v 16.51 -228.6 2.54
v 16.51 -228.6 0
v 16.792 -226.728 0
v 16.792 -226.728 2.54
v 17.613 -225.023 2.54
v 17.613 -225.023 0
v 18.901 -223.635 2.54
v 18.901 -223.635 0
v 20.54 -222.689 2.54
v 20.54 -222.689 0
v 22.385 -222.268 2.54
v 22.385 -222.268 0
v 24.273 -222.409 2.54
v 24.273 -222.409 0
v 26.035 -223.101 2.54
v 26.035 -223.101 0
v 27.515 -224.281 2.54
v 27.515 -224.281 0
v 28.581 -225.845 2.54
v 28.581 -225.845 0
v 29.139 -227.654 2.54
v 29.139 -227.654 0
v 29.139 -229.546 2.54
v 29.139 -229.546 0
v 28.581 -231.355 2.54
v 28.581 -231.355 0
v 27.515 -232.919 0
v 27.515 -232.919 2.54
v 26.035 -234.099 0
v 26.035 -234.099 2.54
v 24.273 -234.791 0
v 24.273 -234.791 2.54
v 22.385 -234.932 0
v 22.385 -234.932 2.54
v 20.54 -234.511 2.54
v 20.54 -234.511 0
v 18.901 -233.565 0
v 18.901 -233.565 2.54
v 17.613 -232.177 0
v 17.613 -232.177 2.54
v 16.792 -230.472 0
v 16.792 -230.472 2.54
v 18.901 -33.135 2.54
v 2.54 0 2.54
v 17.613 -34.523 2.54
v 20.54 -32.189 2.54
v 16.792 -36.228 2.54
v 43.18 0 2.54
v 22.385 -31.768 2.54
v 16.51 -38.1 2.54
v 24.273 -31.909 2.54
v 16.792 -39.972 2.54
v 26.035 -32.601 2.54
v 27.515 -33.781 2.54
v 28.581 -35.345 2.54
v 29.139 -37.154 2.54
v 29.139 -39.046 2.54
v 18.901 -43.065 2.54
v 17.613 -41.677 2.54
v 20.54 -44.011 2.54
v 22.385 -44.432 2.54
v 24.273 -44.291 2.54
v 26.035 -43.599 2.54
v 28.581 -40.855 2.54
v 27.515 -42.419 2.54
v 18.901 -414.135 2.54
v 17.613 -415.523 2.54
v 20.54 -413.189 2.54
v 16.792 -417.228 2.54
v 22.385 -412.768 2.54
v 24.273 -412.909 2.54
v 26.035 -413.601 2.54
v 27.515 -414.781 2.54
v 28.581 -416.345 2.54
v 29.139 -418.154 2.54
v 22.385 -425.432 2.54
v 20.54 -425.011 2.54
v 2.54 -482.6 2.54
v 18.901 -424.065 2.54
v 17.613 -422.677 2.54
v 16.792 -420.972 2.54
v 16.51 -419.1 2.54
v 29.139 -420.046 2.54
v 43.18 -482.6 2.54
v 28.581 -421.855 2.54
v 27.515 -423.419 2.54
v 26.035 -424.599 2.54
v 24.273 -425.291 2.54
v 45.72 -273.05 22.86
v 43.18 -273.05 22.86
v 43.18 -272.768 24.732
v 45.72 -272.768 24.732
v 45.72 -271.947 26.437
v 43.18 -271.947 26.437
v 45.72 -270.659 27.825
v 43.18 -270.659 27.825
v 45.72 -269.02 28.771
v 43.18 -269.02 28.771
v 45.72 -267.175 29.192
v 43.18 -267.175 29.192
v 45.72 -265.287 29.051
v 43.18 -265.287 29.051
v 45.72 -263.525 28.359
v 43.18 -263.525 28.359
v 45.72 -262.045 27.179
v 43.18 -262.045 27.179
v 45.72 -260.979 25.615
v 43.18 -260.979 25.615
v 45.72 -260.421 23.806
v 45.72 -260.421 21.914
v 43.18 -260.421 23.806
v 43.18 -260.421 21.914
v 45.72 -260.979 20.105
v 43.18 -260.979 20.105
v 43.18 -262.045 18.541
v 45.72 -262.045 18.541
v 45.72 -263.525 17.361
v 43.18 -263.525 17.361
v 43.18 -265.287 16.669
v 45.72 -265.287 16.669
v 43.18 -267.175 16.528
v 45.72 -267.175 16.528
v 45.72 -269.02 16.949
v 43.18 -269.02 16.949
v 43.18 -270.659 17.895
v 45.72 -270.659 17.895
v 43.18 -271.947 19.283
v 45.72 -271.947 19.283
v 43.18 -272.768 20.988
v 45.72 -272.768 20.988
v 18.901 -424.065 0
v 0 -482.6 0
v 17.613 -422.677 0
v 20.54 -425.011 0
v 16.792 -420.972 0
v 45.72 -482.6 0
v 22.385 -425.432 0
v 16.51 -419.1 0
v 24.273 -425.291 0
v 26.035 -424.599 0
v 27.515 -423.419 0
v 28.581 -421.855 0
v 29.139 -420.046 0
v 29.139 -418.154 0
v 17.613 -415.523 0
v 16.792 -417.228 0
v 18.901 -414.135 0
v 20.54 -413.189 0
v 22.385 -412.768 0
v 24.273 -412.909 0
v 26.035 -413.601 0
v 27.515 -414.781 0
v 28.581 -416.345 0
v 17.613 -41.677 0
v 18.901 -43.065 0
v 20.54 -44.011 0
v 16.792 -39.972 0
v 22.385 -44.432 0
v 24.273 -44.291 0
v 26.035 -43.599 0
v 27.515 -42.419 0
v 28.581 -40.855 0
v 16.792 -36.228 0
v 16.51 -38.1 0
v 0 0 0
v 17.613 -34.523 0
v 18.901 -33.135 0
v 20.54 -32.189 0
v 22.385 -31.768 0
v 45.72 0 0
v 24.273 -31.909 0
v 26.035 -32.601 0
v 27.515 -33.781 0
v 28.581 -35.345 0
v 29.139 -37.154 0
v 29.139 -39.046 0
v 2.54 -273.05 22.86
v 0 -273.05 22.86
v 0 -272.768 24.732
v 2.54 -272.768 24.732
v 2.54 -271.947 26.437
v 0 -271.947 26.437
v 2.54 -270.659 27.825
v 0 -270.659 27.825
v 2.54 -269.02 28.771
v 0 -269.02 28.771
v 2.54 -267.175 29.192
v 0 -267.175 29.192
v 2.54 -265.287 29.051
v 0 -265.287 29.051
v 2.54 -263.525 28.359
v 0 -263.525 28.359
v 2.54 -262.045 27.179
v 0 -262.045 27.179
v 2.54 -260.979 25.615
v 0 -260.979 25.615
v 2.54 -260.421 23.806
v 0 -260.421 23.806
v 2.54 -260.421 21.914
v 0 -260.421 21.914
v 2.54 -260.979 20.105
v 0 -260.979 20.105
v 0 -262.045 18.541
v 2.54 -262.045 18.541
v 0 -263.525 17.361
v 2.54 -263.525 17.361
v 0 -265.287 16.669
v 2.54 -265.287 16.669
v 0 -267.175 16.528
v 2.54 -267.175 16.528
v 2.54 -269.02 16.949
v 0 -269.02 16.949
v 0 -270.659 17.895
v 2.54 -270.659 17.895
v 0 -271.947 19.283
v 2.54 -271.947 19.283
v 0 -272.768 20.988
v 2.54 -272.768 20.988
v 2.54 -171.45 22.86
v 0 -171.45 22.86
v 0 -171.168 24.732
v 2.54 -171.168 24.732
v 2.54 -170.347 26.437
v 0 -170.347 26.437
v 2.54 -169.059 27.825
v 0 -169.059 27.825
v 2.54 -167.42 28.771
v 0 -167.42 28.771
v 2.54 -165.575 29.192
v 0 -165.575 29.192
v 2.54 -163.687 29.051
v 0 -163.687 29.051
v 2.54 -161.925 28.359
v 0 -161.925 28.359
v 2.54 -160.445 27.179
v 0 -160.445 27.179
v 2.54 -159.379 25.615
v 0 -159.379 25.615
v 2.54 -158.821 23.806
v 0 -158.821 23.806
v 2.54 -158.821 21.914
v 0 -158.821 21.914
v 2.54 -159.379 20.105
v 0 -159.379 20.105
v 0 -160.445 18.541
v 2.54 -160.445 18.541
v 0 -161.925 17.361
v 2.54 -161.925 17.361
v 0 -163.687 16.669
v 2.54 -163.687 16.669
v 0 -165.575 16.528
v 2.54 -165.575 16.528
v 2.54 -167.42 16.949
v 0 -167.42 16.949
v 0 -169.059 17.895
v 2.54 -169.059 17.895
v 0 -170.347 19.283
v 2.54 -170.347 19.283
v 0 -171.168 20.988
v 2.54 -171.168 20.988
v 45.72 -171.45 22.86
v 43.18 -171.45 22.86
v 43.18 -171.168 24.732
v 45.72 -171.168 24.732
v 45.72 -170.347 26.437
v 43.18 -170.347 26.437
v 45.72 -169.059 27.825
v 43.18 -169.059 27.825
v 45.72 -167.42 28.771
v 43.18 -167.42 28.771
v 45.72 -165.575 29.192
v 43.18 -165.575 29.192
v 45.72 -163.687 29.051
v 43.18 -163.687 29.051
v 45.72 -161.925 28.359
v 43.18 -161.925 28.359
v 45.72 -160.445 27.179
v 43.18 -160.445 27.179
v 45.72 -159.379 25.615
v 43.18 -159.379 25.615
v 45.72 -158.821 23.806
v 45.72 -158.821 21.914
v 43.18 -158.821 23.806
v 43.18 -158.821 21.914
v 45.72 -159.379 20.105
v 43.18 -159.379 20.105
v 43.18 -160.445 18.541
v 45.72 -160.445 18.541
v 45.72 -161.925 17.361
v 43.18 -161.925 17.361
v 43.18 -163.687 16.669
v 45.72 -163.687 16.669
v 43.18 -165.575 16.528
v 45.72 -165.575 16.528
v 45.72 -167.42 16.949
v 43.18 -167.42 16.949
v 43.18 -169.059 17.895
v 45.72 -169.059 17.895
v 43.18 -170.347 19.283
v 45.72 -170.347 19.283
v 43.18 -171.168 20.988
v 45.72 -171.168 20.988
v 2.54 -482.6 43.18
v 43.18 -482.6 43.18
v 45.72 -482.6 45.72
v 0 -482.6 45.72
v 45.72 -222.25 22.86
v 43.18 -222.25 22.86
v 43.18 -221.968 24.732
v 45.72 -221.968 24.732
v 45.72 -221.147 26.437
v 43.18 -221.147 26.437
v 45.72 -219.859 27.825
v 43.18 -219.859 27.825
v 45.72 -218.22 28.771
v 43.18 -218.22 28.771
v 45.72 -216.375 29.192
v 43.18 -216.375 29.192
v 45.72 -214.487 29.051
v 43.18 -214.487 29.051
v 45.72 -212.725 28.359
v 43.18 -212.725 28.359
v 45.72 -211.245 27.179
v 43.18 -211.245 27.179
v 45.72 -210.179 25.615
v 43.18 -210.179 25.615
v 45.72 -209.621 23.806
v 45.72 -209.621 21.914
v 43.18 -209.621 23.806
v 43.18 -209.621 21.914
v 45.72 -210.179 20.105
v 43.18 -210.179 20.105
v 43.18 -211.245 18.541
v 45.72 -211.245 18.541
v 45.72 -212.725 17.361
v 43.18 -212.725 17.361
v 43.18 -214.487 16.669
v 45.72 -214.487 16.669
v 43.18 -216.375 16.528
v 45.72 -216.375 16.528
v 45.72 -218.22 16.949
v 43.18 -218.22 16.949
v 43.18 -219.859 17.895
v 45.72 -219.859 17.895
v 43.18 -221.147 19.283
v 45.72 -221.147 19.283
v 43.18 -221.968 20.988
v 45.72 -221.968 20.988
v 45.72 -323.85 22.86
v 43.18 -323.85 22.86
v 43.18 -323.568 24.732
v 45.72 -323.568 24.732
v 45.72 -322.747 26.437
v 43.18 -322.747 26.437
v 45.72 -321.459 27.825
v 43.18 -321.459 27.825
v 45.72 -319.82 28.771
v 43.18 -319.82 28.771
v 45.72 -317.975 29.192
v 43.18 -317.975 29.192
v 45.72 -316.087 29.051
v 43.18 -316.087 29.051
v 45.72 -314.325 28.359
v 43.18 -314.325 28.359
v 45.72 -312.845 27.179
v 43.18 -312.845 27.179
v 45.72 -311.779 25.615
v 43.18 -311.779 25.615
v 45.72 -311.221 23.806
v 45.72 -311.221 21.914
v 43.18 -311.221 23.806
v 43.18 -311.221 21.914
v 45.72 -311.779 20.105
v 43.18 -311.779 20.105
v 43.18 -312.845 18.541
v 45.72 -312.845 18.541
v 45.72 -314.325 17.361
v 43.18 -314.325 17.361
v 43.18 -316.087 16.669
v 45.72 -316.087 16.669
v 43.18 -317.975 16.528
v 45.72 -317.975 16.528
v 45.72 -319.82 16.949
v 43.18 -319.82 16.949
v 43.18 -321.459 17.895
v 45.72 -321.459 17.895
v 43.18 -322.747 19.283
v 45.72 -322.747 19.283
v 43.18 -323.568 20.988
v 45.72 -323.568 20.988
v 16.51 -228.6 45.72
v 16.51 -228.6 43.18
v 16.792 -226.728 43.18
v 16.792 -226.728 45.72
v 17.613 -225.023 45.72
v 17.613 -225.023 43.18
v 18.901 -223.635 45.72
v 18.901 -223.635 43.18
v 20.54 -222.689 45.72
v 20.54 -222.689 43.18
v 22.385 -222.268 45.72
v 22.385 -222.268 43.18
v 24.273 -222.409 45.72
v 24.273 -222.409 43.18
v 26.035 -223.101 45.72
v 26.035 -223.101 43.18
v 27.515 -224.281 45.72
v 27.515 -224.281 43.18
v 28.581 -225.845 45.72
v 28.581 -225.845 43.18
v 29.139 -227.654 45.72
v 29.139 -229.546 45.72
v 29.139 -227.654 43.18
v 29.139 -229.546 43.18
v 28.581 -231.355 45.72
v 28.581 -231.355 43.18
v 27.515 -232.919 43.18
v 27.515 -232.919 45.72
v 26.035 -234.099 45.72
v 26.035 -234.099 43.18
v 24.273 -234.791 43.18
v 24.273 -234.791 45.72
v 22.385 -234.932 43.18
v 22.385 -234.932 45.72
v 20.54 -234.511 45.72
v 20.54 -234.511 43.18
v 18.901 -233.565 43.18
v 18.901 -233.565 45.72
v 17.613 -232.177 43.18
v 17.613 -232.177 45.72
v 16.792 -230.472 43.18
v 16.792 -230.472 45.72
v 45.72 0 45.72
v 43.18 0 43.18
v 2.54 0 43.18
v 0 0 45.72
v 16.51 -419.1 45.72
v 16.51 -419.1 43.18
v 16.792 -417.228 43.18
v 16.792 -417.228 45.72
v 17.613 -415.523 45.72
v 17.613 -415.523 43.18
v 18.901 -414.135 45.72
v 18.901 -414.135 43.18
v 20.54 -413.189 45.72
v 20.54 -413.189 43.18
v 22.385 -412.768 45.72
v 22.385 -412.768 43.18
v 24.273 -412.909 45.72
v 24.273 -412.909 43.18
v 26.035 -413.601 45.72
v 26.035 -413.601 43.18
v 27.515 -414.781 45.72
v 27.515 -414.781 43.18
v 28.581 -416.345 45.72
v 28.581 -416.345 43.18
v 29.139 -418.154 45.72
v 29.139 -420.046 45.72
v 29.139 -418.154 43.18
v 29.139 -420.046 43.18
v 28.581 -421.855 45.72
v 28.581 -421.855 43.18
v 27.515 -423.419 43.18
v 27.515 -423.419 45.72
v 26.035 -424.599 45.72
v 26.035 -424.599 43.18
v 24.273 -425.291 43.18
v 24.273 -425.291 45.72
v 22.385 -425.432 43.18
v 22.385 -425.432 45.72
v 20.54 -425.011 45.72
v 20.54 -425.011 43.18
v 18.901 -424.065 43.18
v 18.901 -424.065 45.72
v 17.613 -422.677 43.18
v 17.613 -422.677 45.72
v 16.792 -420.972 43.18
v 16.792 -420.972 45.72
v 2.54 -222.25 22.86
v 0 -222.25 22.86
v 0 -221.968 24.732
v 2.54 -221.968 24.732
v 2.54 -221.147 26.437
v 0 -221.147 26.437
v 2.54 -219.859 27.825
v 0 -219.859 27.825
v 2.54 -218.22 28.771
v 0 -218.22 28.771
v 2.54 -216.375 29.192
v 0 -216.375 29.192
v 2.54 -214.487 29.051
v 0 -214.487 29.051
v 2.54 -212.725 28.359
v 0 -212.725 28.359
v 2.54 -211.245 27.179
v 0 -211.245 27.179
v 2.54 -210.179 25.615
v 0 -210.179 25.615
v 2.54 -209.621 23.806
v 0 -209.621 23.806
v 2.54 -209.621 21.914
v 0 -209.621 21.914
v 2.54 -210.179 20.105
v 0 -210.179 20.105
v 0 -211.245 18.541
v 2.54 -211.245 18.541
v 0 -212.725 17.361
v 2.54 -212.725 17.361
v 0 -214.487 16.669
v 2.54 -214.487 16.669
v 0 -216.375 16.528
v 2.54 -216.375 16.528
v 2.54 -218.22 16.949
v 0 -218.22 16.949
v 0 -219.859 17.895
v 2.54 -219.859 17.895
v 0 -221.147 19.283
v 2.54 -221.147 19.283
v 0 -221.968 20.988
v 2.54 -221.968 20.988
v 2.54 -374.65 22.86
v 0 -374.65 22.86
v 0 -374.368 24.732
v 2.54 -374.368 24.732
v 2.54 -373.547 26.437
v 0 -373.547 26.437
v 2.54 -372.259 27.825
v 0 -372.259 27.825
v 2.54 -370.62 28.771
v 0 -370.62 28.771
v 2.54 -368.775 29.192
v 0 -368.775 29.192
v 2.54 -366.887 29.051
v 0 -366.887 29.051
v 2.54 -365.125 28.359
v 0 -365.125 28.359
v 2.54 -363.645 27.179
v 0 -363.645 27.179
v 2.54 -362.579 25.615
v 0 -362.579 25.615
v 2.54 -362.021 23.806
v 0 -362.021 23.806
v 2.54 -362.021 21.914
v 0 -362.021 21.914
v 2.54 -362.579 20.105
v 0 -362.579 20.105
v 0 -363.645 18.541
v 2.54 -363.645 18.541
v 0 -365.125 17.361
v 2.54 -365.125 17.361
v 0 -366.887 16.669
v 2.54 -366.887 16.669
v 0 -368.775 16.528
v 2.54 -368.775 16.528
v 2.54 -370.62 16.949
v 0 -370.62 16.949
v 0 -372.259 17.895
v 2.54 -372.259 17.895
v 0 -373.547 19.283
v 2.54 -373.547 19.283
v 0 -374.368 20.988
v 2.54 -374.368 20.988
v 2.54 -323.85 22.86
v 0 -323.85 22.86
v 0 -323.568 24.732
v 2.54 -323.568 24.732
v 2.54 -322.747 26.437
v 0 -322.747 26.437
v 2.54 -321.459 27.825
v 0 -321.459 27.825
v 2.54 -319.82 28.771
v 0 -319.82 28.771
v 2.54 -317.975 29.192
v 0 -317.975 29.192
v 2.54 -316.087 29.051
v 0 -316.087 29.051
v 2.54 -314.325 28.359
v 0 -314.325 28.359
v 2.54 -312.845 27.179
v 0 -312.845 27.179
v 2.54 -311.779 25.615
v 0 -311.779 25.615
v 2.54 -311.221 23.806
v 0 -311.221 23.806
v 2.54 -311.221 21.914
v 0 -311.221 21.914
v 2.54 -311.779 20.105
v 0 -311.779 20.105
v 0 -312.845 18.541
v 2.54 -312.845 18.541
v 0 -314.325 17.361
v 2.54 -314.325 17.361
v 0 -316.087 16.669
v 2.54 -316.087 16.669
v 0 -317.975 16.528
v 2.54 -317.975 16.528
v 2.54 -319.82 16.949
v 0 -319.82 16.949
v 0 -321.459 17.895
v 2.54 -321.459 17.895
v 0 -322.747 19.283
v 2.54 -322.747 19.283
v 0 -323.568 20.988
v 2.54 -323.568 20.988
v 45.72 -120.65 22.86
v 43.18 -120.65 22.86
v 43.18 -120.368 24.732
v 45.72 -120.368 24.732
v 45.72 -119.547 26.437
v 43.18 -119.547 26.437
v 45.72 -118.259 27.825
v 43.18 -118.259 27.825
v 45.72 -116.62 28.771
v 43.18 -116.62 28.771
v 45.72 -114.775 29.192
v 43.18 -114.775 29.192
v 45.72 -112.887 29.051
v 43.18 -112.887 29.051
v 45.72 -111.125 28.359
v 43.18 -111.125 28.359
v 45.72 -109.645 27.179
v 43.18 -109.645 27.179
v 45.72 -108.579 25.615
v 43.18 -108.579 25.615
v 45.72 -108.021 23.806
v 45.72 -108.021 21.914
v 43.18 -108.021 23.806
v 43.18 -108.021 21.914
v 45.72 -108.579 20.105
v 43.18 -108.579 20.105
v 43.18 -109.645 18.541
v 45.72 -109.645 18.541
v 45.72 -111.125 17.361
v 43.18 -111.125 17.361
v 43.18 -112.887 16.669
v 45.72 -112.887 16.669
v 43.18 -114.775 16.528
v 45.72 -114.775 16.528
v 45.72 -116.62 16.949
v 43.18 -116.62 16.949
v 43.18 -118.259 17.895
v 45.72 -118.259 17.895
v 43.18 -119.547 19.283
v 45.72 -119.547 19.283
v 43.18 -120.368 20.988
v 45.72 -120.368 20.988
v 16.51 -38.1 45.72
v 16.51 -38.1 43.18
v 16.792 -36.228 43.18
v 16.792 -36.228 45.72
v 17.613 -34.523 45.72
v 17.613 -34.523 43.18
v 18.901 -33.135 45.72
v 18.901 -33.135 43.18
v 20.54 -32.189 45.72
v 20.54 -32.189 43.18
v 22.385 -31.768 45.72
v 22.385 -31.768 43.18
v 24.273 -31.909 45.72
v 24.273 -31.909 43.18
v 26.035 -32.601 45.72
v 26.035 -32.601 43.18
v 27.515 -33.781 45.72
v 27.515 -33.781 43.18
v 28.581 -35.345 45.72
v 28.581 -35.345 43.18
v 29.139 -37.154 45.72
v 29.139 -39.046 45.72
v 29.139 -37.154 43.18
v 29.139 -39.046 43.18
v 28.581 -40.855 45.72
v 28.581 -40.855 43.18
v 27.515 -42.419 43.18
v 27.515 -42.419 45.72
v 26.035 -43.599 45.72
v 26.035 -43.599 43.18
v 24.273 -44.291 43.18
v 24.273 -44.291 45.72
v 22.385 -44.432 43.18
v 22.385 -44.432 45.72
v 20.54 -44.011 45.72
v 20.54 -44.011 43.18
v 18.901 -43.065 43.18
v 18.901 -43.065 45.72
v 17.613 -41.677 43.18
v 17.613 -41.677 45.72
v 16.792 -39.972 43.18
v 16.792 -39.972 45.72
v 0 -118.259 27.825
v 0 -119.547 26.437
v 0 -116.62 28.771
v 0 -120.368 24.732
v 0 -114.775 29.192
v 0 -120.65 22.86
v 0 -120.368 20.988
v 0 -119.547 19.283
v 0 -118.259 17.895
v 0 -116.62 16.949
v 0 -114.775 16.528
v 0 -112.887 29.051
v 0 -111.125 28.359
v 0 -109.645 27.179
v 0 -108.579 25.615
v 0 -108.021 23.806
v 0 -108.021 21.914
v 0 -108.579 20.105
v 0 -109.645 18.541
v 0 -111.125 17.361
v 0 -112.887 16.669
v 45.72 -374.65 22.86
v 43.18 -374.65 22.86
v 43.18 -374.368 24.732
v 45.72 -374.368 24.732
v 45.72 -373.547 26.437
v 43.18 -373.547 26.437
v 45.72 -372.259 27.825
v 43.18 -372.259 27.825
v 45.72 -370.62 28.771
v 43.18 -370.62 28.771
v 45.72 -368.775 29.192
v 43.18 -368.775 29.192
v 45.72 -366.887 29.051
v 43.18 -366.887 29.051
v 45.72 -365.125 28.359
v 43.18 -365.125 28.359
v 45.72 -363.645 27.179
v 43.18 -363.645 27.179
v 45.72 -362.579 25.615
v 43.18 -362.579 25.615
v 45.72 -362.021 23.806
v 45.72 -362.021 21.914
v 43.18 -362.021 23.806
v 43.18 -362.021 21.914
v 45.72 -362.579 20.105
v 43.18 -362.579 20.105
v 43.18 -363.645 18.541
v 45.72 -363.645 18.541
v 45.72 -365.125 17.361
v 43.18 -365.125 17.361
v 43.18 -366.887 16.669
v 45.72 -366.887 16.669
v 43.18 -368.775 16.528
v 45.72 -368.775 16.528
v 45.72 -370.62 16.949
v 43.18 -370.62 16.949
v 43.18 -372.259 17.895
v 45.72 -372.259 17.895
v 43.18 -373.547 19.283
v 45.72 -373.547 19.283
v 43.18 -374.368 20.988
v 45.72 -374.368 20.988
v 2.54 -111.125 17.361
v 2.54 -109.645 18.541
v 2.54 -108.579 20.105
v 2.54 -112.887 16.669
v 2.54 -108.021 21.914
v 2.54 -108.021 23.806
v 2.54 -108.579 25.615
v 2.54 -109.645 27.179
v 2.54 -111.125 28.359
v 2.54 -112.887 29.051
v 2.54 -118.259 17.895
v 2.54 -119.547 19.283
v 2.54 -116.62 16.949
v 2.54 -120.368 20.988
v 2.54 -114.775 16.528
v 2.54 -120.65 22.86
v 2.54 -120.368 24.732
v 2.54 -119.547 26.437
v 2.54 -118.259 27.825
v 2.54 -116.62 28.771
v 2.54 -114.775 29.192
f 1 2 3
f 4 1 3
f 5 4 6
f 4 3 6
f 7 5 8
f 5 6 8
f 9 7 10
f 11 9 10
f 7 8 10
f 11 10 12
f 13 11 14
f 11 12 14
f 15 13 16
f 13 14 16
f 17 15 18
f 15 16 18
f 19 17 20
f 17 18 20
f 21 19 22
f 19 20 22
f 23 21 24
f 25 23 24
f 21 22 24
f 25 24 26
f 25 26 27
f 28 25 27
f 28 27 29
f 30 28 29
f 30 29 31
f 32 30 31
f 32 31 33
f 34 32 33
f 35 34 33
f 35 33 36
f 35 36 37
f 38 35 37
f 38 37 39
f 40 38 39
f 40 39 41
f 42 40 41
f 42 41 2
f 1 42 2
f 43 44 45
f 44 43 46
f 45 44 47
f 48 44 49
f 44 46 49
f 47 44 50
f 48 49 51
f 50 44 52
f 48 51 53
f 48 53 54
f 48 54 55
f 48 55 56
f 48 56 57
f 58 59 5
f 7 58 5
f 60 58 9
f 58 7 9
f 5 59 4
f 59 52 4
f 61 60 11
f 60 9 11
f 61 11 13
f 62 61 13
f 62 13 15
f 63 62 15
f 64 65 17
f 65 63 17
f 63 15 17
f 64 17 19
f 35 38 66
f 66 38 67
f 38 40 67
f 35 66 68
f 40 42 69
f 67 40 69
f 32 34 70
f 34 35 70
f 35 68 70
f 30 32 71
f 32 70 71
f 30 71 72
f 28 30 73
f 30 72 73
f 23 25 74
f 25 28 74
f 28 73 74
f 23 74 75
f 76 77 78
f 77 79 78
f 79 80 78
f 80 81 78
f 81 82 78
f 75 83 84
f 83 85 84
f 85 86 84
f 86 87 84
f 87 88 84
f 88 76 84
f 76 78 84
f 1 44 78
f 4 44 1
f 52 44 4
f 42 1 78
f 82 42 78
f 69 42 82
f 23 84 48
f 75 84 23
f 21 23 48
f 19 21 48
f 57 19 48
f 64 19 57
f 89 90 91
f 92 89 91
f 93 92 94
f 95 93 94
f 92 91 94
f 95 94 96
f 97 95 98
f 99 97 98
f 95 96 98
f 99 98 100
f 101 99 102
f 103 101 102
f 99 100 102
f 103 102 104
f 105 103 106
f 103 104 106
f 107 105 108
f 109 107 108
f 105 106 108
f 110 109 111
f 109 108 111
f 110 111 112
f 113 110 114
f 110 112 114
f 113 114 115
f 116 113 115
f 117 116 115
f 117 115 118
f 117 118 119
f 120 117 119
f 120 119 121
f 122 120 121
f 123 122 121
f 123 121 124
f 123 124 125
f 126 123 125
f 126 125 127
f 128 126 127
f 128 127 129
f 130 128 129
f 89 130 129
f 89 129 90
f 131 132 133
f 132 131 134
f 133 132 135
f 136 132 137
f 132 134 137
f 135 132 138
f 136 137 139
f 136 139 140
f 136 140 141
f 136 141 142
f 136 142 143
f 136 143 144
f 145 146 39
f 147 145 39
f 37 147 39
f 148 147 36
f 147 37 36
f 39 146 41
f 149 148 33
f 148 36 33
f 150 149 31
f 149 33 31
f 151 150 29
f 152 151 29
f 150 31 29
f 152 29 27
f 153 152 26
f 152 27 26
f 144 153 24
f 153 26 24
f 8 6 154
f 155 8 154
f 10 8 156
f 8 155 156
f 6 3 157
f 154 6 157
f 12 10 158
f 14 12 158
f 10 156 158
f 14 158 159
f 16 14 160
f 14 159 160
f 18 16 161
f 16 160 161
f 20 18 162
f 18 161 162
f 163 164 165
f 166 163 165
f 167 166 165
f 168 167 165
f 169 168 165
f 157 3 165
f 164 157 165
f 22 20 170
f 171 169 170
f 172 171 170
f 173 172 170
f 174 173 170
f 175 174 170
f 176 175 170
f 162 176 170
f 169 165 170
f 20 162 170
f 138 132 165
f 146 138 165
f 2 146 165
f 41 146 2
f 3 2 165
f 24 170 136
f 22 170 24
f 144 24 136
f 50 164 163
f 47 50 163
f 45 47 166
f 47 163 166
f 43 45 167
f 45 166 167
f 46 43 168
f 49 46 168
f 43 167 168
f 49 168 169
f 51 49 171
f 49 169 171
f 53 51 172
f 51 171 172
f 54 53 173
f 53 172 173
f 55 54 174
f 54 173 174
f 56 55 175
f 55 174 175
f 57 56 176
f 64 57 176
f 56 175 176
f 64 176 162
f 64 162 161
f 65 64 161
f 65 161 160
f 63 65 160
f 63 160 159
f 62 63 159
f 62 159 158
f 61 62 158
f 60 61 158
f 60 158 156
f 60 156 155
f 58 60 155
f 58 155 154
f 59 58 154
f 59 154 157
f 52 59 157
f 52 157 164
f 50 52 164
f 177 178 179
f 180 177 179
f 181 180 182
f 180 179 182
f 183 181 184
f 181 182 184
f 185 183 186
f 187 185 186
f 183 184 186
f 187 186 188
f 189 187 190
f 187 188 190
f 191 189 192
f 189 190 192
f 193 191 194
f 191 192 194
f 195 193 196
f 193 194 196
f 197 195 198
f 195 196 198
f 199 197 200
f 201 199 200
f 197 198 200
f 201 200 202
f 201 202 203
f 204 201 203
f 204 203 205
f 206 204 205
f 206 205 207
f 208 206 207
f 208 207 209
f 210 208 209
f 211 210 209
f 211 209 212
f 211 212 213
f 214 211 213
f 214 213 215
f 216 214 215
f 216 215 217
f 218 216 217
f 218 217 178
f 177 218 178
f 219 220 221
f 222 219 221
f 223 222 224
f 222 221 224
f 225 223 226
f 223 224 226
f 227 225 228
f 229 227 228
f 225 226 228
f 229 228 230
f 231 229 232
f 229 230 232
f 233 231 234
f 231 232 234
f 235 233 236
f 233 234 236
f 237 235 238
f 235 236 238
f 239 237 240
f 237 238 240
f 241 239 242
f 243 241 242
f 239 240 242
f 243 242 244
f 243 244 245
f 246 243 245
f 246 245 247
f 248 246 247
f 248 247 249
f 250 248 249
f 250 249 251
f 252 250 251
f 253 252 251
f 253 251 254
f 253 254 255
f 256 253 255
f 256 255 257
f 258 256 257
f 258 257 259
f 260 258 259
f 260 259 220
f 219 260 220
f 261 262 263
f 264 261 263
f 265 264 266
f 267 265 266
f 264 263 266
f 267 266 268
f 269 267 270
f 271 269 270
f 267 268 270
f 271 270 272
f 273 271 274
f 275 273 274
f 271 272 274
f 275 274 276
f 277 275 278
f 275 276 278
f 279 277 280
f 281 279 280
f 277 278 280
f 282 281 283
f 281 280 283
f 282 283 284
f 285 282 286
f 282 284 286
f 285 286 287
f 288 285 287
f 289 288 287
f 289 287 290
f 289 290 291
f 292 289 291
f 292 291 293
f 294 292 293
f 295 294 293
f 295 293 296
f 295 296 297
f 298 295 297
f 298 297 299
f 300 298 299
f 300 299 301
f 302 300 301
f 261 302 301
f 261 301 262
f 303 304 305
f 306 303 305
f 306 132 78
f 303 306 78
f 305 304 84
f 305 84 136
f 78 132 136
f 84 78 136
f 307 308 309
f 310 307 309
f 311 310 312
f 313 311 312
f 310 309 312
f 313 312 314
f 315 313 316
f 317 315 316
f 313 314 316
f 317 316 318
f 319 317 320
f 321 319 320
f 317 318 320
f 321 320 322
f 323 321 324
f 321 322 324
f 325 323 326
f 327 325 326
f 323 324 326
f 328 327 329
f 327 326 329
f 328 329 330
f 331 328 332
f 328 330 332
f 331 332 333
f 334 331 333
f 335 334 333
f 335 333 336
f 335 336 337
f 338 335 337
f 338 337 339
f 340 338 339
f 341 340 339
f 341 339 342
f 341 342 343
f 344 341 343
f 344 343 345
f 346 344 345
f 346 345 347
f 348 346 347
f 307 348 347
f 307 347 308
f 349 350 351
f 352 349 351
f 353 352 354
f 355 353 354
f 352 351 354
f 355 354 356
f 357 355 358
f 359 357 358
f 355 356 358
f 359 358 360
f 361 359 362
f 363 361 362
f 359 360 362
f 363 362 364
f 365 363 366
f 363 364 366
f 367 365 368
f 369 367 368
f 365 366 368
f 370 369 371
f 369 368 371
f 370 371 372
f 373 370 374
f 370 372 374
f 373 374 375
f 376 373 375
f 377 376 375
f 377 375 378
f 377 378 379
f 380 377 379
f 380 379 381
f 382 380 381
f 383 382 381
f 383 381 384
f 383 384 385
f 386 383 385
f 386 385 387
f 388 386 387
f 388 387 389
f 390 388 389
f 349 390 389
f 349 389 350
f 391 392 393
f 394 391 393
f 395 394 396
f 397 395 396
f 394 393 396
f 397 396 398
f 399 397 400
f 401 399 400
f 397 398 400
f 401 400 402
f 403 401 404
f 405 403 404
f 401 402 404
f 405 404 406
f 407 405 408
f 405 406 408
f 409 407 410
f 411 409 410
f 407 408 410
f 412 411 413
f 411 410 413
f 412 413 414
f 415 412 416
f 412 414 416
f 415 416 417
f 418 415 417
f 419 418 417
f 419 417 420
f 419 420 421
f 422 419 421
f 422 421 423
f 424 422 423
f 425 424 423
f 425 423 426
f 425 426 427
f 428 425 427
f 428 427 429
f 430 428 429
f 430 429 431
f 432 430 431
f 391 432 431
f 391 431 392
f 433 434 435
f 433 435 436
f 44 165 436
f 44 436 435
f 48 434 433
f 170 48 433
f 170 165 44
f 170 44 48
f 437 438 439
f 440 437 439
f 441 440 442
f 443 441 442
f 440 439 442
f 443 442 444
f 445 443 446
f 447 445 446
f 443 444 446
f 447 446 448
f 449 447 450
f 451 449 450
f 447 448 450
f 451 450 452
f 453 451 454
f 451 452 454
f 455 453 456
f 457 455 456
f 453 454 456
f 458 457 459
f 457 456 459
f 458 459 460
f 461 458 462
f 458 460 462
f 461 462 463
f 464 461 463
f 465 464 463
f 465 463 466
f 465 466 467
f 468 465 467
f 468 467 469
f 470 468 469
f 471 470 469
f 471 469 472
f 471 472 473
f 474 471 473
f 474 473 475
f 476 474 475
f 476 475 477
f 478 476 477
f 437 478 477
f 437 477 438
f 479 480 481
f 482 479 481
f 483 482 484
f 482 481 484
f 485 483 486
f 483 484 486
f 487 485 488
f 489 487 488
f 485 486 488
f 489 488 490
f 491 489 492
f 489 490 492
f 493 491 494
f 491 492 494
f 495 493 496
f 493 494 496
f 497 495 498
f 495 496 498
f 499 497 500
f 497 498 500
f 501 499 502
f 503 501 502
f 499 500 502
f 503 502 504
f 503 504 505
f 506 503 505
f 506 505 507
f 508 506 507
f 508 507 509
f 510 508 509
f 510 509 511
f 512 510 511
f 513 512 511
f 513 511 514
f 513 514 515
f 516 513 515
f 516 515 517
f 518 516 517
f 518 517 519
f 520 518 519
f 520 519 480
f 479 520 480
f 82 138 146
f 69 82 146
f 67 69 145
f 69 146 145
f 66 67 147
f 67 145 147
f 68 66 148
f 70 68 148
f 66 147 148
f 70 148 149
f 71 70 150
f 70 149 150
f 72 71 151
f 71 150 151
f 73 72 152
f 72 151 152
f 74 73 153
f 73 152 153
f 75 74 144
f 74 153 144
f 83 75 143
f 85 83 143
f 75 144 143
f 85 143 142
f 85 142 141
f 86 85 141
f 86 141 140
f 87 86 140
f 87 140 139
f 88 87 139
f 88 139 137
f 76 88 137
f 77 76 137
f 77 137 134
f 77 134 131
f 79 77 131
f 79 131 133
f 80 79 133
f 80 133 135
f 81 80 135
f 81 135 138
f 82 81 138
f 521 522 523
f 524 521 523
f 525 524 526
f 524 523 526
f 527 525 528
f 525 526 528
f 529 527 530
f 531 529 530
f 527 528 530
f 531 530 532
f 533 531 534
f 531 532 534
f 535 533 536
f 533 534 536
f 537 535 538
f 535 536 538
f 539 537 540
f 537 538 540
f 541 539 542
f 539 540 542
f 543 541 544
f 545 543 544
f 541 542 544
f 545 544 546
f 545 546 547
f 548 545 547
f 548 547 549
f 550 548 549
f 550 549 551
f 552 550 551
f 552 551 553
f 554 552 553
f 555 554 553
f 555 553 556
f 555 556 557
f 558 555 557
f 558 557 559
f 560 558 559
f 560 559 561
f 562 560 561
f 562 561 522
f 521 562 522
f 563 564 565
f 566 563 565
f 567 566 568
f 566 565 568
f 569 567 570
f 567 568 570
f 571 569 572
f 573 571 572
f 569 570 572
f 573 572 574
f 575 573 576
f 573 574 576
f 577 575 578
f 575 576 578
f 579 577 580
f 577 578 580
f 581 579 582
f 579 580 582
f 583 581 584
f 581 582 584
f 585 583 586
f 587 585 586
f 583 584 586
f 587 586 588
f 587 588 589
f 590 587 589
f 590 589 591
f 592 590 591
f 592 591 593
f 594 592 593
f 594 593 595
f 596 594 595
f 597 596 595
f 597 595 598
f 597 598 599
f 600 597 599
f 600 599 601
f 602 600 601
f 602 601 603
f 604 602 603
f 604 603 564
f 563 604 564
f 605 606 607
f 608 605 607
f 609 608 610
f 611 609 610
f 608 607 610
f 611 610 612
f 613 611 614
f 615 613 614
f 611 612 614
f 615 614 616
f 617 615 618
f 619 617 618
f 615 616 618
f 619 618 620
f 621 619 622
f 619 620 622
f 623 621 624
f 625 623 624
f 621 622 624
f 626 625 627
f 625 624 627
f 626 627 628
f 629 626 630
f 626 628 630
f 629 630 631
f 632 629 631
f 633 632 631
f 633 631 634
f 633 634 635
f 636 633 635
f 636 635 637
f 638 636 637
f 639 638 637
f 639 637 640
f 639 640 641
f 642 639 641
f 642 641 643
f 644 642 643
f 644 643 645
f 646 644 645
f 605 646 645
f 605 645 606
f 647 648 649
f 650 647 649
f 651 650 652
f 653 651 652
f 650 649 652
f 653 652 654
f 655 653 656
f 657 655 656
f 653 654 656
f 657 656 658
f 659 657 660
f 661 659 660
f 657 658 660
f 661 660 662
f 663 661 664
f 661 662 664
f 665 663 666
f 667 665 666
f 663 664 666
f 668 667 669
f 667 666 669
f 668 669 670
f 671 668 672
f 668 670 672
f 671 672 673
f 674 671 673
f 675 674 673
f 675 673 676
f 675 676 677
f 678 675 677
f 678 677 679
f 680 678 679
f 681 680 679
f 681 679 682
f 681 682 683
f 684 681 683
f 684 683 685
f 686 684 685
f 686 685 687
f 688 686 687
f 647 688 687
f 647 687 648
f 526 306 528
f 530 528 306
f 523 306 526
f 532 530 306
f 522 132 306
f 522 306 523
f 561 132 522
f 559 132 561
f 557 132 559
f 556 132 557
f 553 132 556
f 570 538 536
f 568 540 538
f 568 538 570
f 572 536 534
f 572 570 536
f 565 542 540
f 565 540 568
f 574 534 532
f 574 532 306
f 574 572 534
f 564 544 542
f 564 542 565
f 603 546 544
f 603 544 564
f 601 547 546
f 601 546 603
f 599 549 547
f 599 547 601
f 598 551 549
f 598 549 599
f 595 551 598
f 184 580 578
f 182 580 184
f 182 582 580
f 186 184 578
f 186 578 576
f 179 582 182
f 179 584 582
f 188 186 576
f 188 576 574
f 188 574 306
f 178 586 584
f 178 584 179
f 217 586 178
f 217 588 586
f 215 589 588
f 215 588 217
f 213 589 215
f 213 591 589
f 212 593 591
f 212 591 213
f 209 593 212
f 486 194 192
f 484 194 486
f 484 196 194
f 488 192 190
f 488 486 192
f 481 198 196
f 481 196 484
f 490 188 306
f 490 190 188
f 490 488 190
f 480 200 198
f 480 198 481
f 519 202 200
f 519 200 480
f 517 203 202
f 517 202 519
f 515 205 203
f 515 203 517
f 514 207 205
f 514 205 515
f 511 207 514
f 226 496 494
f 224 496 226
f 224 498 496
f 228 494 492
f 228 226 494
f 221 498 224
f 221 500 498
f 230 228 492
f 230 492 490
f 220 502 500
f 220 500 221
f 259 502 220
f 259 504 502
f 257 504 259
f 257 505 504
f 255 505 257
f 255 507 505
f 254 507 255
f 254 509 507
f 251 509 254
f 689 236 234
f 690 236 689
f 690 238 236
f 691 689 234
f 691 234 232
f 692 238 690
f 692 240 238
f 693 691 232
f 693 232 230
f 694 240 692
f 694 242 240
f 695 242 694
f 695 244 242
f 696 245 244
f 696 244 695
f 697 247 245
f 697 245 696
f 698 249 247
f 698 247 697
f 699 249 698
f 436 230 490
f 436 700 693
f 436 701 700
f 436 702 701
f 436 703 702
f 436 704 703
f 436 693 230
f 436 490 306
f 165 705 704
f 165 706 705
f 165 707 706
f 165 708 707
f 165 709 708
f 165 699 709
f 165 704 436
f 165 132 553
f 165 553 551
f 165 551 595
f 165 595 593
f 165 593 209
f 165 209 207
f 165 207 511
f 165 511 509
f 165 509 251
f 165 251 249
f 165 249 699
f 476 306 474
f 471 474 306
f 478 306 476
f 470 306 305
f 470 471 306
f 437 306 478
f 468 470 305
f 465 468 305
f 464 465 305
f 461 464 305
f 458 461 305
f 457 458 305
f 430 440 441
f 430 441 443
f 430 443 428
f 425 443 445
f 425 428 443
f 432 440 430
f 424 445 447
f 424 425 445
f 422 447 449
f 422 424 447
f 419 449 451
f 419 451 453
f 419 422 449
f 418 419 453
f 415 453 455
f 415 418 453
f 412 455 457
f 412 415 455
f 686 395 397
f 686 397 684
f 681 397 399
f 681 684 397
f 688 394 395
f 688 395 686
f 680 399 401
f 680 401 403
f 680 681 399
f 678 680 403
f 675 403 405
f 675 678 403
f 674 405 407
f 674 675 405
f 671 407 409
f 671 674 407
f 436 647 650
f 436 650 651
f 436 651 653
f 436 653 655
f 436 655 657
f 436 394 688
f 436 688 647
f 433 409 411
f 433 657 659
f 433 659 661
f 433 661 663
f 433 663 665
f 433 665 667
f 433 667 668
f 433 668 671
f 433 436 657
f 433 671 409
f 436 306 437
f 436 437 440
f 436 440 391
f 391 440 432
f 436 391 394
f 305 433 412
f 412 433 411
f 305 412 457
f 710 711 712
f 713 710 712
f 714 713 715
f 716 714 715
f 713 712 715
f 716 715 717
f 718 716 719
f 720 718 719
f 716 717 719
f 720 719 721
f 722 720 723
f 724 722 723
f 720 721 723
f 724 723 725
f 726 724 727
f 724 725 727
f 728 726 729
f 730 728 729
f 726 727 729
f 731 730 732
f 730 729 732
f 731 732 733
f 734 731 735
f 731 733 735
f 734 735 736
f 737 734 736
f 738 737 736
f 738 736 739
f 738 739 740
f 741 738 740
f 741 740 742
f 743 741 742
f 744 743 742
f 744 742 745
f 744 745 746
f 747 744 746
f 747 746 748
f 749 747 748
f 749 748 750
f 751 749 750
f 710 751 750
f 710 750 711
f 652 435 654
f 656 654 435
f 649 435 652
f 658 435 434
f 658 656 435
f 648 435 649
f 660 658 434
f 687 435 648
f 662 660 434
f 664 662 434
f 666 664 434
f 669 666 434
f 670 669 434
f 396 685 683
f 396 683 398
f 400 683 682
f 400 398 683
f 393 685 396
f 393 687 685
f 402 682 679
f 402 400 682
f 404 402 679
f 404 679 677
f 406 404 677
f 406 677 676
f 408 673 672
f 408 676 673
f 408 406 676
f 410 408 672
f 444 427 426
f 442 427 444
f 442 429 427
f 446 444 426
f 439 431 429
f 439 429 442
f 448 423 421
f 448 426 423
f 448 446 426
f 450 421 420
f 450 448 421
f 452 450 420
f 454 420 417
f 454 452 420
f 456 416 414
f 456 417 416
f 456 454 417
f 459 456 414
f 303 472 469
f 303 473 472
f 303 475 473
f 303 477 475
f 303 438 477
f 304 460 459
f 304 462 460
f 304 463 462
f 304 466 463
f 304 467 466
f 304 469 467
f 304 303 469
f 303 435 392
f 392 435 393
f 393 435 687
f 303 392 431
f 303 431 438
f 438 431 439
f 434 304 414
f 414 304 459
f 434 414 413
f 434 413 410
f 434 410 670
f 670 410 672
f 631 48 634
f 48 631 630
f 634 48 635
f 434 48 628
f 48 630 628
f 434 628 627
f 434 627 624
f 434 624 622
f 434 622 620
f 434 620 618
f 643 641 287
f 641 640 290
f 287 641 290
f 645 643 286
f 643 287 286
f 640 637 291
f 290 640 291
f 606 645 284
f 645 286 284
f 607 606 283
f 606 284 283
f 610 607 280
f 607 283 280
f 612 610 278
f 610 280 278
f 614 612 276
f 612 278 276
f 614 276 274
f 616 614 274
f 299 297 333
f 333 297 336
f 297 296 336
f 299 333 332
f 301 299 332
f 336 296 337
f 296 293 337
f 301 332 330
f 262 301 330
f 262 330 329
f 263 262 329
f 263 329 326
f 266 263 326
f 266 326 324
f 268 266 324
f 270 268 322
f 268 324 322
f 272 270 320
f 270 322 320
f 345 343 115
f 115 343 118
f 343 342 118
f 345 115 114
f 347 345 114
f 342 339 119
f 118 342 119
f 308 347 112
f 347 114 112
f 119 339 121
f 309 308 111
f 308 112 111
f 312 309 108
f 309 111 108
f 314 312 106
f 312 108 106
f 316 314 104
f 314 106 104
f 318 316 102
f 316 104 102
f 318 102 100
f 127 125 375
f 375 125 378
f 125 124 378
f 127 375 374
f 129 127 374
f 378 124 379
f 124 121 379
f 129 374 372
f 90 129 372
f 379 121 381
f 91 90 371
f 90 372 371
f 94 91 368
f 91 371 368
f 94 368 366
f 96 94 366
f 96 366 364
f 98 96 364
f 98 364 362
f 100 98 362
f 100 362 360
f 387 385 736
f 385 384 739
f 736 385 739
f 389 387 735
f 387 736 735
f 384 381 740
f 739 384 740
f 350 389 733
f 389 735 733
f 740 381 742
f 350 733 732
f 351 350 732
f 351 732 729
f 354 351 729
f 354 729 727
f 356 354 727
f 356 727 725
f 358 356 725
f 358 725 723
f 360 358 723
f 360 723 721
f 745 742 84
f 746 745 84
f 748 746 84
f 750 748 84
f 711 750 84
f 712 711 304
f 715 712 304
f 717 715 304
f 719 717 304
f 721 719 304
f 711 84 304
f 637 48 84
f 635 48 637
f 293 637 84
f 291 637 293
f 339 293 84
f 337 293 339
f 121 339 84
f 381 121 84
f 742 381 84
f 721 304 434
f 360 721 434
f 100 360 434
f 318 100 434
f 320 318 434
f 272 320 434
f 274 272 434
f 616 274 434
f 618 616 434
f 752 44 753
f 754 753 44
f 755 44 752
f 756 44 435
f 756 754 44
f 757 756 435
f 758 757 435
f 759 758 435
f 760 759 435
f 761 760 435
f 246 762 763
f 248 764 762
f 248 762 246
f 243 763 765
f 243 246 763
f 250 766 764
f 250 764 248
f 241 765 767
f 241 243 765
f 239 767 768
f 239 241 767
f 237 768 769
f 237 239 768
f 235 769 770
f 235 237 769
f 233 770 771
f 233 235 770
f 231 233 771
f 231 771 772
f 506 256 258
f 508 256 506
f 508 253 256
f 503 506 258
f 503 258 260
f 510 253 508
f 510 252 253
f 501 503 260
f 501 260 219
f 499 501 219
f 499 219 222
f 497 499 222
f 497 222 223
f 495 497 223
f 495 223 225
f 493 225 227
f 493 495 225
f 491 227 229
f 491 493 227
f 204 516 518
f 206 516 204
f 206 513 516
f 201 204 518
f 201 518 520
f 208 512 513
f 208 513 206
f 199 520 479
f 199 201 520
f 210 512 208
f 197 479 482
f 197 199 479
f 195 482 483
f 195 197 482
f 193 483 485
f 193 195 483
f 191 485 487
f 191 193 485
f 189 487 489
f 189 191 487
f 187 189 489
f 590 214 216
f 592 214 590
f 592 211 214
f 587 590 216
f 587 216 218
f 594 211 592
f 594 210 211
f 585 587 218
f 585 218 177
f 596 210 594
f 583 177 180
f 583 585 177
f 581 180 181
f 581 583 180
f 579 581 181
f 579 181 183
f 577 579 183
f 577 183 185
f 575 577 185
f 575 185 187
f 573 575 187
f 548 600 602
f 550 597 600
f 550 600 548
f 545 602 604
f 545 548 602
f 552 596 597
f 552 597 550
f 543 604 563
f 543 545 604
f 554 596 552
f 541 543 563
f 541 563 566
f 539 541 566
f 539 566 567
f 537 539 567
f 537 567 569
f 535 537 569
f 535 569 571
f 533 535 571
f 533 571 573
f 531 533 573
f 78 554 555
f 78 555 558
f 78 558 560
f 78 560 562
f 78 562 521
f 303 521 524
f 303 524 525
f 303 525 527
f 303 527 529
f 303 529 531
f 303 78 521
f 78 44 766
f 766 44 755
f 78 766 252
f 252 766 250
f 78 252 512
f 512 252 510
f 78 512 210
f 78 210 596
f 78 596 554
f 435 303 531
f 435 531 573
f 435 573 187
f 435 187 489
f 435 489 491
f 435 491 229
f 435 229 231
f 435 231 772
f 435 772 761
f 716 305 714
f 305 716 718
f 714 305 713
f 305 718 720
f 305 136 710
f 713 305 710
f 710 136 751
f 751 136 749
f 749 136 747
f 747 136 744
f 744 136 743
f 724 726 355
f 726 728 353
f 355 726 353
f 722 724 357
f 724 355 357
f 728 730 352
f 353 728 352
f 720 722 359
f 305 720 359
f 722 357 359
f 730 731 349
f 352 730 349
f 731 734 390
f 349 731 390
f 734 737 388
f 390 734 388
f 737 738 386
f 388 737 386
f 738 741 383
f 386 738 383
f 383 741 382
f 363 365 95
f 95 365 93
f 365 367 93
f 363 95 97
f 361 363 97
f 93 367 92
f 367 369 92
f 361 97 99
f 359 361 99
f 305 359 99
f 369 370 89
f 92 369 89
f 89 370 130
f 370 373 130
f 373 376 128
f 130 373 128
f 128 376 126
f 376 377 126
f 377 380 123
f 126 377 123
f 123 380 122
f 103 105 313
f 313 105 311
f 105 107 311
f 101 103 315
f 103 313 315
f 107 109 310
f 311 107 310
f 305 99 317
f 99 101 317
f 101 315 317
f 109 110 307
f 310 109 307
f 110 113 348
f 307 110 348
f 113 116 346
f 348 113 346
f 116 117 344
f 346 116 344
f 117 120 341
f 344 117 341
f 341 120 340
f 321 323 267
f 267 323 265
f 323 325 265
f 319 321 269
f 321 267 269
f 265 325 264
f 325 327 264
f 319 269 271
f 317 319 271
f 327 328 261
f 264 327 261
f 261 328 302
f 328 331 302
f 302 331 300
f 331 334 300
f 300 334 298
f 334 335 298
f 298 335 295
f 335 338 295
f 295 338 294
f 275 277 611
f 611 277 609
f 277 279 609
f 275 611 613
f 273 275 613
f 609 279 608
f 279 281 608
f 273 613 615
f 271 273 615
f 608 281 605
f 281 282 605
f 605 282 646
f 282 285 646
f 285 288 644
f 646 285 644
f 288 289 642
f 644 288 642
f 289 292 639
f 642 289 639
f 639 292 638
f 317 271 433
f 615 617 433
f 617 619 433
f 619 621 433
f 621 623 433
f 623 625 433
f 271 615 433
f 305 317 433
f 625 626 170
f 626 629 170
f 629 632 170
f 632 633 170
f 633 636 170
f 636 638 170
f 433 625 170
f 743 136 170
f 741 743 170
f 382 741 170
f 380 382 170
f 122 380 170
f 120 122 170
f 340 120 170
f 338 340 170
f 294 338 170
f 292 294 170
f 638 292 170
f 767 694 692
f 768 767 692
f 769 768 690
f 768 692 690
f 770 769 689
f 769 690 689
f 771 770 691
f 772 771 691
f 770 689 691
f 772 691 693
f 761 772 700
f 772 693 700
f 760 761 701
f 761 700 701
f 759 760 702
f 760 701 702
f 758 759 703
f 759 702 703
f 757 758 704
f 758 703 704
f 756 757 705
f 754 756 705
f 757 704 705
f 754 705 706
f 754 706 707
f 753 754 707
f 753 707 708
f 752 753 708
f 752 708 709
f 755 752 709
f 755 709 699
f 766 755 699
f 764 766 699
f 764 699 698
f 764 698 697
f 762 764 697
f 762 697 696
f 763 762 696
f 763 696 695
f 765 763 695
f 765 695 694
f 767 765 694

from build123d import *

# Parameters (mm, degrees)
SKETCH1_W                 = 45.72
SKETCH1_H                 = 482.6
BOSS_EXTRUDE1_DEPTH       = 45.72
SHELL1_T                  = -2.54
SKETCH5_W                 = 40.64
SKETCH5_H                 = 40.64
CUT_EXTRUDE1_DEPTH        = 2.54
F_97_0_5_DIAMETER_HOLE1_D = 12.7
F_97_0_5_DIAMETER_HOLE2_D = 12.7


with BuildPart() as part:
    # Sketch1 → Boss-Extrude1 (new body)
    with BuildSketch(Plane.XY):
        with Locations((22.86, -241.3)):
            Rectangle(SKETCH1_W, SKETCH1_H)
    extrude(amount=BOSS_EXTRUDE1_DEPTH)

    # Shell1
    shell1_openings = [part.faces().sort_by_distance(p)[0] for p in [
        (22.86, 0, 22.86),
    ]]
    offset(amount=SHELL1_T, openings=shell1_openings, kind=Kind.INTERSECTION)

    # Sketch5 → Cut-Extrude1 (cut)
    with BuildSketch(Plane.XZ.offset(482.6)):
        with Locations((22.86, 22.86)):
            Rectangle(SKETCH5_W, SKETCH5_H)
    extrude(amount=-CUT_EXTRUDE1_DEPTH, mode=Mode.SUBTRACT)

    # #97 (0.5) Diameter Hole1 (through all)
    with Locations(Plane(origin=(22.86, -38.1, 45.72), x_dir=(1, 0, 0), z_dir=(0, 0, 1))):
        with Locations((0, 0), (0, -190.5), (0, -381)):
            Hole(F_97_0_5_DIAMETER_HOLE1_D / 2)

    # #97 (0.5) Diameter Hole2 (through all)
    with Locations(Plane(origin=(45.72, -114.3, 22.86), x_dir=(0, 1, 0), z_dir=(1, 0, 0))):
        with Locations((0, 0), (-50.8, 0), (-101.6, 0), (-152.4, 0), (-203.2, 0), (-254, 0)):
            Hole(F_97_0_5_DIAMETER_HOLE2_D / 2)


solid = part.part
